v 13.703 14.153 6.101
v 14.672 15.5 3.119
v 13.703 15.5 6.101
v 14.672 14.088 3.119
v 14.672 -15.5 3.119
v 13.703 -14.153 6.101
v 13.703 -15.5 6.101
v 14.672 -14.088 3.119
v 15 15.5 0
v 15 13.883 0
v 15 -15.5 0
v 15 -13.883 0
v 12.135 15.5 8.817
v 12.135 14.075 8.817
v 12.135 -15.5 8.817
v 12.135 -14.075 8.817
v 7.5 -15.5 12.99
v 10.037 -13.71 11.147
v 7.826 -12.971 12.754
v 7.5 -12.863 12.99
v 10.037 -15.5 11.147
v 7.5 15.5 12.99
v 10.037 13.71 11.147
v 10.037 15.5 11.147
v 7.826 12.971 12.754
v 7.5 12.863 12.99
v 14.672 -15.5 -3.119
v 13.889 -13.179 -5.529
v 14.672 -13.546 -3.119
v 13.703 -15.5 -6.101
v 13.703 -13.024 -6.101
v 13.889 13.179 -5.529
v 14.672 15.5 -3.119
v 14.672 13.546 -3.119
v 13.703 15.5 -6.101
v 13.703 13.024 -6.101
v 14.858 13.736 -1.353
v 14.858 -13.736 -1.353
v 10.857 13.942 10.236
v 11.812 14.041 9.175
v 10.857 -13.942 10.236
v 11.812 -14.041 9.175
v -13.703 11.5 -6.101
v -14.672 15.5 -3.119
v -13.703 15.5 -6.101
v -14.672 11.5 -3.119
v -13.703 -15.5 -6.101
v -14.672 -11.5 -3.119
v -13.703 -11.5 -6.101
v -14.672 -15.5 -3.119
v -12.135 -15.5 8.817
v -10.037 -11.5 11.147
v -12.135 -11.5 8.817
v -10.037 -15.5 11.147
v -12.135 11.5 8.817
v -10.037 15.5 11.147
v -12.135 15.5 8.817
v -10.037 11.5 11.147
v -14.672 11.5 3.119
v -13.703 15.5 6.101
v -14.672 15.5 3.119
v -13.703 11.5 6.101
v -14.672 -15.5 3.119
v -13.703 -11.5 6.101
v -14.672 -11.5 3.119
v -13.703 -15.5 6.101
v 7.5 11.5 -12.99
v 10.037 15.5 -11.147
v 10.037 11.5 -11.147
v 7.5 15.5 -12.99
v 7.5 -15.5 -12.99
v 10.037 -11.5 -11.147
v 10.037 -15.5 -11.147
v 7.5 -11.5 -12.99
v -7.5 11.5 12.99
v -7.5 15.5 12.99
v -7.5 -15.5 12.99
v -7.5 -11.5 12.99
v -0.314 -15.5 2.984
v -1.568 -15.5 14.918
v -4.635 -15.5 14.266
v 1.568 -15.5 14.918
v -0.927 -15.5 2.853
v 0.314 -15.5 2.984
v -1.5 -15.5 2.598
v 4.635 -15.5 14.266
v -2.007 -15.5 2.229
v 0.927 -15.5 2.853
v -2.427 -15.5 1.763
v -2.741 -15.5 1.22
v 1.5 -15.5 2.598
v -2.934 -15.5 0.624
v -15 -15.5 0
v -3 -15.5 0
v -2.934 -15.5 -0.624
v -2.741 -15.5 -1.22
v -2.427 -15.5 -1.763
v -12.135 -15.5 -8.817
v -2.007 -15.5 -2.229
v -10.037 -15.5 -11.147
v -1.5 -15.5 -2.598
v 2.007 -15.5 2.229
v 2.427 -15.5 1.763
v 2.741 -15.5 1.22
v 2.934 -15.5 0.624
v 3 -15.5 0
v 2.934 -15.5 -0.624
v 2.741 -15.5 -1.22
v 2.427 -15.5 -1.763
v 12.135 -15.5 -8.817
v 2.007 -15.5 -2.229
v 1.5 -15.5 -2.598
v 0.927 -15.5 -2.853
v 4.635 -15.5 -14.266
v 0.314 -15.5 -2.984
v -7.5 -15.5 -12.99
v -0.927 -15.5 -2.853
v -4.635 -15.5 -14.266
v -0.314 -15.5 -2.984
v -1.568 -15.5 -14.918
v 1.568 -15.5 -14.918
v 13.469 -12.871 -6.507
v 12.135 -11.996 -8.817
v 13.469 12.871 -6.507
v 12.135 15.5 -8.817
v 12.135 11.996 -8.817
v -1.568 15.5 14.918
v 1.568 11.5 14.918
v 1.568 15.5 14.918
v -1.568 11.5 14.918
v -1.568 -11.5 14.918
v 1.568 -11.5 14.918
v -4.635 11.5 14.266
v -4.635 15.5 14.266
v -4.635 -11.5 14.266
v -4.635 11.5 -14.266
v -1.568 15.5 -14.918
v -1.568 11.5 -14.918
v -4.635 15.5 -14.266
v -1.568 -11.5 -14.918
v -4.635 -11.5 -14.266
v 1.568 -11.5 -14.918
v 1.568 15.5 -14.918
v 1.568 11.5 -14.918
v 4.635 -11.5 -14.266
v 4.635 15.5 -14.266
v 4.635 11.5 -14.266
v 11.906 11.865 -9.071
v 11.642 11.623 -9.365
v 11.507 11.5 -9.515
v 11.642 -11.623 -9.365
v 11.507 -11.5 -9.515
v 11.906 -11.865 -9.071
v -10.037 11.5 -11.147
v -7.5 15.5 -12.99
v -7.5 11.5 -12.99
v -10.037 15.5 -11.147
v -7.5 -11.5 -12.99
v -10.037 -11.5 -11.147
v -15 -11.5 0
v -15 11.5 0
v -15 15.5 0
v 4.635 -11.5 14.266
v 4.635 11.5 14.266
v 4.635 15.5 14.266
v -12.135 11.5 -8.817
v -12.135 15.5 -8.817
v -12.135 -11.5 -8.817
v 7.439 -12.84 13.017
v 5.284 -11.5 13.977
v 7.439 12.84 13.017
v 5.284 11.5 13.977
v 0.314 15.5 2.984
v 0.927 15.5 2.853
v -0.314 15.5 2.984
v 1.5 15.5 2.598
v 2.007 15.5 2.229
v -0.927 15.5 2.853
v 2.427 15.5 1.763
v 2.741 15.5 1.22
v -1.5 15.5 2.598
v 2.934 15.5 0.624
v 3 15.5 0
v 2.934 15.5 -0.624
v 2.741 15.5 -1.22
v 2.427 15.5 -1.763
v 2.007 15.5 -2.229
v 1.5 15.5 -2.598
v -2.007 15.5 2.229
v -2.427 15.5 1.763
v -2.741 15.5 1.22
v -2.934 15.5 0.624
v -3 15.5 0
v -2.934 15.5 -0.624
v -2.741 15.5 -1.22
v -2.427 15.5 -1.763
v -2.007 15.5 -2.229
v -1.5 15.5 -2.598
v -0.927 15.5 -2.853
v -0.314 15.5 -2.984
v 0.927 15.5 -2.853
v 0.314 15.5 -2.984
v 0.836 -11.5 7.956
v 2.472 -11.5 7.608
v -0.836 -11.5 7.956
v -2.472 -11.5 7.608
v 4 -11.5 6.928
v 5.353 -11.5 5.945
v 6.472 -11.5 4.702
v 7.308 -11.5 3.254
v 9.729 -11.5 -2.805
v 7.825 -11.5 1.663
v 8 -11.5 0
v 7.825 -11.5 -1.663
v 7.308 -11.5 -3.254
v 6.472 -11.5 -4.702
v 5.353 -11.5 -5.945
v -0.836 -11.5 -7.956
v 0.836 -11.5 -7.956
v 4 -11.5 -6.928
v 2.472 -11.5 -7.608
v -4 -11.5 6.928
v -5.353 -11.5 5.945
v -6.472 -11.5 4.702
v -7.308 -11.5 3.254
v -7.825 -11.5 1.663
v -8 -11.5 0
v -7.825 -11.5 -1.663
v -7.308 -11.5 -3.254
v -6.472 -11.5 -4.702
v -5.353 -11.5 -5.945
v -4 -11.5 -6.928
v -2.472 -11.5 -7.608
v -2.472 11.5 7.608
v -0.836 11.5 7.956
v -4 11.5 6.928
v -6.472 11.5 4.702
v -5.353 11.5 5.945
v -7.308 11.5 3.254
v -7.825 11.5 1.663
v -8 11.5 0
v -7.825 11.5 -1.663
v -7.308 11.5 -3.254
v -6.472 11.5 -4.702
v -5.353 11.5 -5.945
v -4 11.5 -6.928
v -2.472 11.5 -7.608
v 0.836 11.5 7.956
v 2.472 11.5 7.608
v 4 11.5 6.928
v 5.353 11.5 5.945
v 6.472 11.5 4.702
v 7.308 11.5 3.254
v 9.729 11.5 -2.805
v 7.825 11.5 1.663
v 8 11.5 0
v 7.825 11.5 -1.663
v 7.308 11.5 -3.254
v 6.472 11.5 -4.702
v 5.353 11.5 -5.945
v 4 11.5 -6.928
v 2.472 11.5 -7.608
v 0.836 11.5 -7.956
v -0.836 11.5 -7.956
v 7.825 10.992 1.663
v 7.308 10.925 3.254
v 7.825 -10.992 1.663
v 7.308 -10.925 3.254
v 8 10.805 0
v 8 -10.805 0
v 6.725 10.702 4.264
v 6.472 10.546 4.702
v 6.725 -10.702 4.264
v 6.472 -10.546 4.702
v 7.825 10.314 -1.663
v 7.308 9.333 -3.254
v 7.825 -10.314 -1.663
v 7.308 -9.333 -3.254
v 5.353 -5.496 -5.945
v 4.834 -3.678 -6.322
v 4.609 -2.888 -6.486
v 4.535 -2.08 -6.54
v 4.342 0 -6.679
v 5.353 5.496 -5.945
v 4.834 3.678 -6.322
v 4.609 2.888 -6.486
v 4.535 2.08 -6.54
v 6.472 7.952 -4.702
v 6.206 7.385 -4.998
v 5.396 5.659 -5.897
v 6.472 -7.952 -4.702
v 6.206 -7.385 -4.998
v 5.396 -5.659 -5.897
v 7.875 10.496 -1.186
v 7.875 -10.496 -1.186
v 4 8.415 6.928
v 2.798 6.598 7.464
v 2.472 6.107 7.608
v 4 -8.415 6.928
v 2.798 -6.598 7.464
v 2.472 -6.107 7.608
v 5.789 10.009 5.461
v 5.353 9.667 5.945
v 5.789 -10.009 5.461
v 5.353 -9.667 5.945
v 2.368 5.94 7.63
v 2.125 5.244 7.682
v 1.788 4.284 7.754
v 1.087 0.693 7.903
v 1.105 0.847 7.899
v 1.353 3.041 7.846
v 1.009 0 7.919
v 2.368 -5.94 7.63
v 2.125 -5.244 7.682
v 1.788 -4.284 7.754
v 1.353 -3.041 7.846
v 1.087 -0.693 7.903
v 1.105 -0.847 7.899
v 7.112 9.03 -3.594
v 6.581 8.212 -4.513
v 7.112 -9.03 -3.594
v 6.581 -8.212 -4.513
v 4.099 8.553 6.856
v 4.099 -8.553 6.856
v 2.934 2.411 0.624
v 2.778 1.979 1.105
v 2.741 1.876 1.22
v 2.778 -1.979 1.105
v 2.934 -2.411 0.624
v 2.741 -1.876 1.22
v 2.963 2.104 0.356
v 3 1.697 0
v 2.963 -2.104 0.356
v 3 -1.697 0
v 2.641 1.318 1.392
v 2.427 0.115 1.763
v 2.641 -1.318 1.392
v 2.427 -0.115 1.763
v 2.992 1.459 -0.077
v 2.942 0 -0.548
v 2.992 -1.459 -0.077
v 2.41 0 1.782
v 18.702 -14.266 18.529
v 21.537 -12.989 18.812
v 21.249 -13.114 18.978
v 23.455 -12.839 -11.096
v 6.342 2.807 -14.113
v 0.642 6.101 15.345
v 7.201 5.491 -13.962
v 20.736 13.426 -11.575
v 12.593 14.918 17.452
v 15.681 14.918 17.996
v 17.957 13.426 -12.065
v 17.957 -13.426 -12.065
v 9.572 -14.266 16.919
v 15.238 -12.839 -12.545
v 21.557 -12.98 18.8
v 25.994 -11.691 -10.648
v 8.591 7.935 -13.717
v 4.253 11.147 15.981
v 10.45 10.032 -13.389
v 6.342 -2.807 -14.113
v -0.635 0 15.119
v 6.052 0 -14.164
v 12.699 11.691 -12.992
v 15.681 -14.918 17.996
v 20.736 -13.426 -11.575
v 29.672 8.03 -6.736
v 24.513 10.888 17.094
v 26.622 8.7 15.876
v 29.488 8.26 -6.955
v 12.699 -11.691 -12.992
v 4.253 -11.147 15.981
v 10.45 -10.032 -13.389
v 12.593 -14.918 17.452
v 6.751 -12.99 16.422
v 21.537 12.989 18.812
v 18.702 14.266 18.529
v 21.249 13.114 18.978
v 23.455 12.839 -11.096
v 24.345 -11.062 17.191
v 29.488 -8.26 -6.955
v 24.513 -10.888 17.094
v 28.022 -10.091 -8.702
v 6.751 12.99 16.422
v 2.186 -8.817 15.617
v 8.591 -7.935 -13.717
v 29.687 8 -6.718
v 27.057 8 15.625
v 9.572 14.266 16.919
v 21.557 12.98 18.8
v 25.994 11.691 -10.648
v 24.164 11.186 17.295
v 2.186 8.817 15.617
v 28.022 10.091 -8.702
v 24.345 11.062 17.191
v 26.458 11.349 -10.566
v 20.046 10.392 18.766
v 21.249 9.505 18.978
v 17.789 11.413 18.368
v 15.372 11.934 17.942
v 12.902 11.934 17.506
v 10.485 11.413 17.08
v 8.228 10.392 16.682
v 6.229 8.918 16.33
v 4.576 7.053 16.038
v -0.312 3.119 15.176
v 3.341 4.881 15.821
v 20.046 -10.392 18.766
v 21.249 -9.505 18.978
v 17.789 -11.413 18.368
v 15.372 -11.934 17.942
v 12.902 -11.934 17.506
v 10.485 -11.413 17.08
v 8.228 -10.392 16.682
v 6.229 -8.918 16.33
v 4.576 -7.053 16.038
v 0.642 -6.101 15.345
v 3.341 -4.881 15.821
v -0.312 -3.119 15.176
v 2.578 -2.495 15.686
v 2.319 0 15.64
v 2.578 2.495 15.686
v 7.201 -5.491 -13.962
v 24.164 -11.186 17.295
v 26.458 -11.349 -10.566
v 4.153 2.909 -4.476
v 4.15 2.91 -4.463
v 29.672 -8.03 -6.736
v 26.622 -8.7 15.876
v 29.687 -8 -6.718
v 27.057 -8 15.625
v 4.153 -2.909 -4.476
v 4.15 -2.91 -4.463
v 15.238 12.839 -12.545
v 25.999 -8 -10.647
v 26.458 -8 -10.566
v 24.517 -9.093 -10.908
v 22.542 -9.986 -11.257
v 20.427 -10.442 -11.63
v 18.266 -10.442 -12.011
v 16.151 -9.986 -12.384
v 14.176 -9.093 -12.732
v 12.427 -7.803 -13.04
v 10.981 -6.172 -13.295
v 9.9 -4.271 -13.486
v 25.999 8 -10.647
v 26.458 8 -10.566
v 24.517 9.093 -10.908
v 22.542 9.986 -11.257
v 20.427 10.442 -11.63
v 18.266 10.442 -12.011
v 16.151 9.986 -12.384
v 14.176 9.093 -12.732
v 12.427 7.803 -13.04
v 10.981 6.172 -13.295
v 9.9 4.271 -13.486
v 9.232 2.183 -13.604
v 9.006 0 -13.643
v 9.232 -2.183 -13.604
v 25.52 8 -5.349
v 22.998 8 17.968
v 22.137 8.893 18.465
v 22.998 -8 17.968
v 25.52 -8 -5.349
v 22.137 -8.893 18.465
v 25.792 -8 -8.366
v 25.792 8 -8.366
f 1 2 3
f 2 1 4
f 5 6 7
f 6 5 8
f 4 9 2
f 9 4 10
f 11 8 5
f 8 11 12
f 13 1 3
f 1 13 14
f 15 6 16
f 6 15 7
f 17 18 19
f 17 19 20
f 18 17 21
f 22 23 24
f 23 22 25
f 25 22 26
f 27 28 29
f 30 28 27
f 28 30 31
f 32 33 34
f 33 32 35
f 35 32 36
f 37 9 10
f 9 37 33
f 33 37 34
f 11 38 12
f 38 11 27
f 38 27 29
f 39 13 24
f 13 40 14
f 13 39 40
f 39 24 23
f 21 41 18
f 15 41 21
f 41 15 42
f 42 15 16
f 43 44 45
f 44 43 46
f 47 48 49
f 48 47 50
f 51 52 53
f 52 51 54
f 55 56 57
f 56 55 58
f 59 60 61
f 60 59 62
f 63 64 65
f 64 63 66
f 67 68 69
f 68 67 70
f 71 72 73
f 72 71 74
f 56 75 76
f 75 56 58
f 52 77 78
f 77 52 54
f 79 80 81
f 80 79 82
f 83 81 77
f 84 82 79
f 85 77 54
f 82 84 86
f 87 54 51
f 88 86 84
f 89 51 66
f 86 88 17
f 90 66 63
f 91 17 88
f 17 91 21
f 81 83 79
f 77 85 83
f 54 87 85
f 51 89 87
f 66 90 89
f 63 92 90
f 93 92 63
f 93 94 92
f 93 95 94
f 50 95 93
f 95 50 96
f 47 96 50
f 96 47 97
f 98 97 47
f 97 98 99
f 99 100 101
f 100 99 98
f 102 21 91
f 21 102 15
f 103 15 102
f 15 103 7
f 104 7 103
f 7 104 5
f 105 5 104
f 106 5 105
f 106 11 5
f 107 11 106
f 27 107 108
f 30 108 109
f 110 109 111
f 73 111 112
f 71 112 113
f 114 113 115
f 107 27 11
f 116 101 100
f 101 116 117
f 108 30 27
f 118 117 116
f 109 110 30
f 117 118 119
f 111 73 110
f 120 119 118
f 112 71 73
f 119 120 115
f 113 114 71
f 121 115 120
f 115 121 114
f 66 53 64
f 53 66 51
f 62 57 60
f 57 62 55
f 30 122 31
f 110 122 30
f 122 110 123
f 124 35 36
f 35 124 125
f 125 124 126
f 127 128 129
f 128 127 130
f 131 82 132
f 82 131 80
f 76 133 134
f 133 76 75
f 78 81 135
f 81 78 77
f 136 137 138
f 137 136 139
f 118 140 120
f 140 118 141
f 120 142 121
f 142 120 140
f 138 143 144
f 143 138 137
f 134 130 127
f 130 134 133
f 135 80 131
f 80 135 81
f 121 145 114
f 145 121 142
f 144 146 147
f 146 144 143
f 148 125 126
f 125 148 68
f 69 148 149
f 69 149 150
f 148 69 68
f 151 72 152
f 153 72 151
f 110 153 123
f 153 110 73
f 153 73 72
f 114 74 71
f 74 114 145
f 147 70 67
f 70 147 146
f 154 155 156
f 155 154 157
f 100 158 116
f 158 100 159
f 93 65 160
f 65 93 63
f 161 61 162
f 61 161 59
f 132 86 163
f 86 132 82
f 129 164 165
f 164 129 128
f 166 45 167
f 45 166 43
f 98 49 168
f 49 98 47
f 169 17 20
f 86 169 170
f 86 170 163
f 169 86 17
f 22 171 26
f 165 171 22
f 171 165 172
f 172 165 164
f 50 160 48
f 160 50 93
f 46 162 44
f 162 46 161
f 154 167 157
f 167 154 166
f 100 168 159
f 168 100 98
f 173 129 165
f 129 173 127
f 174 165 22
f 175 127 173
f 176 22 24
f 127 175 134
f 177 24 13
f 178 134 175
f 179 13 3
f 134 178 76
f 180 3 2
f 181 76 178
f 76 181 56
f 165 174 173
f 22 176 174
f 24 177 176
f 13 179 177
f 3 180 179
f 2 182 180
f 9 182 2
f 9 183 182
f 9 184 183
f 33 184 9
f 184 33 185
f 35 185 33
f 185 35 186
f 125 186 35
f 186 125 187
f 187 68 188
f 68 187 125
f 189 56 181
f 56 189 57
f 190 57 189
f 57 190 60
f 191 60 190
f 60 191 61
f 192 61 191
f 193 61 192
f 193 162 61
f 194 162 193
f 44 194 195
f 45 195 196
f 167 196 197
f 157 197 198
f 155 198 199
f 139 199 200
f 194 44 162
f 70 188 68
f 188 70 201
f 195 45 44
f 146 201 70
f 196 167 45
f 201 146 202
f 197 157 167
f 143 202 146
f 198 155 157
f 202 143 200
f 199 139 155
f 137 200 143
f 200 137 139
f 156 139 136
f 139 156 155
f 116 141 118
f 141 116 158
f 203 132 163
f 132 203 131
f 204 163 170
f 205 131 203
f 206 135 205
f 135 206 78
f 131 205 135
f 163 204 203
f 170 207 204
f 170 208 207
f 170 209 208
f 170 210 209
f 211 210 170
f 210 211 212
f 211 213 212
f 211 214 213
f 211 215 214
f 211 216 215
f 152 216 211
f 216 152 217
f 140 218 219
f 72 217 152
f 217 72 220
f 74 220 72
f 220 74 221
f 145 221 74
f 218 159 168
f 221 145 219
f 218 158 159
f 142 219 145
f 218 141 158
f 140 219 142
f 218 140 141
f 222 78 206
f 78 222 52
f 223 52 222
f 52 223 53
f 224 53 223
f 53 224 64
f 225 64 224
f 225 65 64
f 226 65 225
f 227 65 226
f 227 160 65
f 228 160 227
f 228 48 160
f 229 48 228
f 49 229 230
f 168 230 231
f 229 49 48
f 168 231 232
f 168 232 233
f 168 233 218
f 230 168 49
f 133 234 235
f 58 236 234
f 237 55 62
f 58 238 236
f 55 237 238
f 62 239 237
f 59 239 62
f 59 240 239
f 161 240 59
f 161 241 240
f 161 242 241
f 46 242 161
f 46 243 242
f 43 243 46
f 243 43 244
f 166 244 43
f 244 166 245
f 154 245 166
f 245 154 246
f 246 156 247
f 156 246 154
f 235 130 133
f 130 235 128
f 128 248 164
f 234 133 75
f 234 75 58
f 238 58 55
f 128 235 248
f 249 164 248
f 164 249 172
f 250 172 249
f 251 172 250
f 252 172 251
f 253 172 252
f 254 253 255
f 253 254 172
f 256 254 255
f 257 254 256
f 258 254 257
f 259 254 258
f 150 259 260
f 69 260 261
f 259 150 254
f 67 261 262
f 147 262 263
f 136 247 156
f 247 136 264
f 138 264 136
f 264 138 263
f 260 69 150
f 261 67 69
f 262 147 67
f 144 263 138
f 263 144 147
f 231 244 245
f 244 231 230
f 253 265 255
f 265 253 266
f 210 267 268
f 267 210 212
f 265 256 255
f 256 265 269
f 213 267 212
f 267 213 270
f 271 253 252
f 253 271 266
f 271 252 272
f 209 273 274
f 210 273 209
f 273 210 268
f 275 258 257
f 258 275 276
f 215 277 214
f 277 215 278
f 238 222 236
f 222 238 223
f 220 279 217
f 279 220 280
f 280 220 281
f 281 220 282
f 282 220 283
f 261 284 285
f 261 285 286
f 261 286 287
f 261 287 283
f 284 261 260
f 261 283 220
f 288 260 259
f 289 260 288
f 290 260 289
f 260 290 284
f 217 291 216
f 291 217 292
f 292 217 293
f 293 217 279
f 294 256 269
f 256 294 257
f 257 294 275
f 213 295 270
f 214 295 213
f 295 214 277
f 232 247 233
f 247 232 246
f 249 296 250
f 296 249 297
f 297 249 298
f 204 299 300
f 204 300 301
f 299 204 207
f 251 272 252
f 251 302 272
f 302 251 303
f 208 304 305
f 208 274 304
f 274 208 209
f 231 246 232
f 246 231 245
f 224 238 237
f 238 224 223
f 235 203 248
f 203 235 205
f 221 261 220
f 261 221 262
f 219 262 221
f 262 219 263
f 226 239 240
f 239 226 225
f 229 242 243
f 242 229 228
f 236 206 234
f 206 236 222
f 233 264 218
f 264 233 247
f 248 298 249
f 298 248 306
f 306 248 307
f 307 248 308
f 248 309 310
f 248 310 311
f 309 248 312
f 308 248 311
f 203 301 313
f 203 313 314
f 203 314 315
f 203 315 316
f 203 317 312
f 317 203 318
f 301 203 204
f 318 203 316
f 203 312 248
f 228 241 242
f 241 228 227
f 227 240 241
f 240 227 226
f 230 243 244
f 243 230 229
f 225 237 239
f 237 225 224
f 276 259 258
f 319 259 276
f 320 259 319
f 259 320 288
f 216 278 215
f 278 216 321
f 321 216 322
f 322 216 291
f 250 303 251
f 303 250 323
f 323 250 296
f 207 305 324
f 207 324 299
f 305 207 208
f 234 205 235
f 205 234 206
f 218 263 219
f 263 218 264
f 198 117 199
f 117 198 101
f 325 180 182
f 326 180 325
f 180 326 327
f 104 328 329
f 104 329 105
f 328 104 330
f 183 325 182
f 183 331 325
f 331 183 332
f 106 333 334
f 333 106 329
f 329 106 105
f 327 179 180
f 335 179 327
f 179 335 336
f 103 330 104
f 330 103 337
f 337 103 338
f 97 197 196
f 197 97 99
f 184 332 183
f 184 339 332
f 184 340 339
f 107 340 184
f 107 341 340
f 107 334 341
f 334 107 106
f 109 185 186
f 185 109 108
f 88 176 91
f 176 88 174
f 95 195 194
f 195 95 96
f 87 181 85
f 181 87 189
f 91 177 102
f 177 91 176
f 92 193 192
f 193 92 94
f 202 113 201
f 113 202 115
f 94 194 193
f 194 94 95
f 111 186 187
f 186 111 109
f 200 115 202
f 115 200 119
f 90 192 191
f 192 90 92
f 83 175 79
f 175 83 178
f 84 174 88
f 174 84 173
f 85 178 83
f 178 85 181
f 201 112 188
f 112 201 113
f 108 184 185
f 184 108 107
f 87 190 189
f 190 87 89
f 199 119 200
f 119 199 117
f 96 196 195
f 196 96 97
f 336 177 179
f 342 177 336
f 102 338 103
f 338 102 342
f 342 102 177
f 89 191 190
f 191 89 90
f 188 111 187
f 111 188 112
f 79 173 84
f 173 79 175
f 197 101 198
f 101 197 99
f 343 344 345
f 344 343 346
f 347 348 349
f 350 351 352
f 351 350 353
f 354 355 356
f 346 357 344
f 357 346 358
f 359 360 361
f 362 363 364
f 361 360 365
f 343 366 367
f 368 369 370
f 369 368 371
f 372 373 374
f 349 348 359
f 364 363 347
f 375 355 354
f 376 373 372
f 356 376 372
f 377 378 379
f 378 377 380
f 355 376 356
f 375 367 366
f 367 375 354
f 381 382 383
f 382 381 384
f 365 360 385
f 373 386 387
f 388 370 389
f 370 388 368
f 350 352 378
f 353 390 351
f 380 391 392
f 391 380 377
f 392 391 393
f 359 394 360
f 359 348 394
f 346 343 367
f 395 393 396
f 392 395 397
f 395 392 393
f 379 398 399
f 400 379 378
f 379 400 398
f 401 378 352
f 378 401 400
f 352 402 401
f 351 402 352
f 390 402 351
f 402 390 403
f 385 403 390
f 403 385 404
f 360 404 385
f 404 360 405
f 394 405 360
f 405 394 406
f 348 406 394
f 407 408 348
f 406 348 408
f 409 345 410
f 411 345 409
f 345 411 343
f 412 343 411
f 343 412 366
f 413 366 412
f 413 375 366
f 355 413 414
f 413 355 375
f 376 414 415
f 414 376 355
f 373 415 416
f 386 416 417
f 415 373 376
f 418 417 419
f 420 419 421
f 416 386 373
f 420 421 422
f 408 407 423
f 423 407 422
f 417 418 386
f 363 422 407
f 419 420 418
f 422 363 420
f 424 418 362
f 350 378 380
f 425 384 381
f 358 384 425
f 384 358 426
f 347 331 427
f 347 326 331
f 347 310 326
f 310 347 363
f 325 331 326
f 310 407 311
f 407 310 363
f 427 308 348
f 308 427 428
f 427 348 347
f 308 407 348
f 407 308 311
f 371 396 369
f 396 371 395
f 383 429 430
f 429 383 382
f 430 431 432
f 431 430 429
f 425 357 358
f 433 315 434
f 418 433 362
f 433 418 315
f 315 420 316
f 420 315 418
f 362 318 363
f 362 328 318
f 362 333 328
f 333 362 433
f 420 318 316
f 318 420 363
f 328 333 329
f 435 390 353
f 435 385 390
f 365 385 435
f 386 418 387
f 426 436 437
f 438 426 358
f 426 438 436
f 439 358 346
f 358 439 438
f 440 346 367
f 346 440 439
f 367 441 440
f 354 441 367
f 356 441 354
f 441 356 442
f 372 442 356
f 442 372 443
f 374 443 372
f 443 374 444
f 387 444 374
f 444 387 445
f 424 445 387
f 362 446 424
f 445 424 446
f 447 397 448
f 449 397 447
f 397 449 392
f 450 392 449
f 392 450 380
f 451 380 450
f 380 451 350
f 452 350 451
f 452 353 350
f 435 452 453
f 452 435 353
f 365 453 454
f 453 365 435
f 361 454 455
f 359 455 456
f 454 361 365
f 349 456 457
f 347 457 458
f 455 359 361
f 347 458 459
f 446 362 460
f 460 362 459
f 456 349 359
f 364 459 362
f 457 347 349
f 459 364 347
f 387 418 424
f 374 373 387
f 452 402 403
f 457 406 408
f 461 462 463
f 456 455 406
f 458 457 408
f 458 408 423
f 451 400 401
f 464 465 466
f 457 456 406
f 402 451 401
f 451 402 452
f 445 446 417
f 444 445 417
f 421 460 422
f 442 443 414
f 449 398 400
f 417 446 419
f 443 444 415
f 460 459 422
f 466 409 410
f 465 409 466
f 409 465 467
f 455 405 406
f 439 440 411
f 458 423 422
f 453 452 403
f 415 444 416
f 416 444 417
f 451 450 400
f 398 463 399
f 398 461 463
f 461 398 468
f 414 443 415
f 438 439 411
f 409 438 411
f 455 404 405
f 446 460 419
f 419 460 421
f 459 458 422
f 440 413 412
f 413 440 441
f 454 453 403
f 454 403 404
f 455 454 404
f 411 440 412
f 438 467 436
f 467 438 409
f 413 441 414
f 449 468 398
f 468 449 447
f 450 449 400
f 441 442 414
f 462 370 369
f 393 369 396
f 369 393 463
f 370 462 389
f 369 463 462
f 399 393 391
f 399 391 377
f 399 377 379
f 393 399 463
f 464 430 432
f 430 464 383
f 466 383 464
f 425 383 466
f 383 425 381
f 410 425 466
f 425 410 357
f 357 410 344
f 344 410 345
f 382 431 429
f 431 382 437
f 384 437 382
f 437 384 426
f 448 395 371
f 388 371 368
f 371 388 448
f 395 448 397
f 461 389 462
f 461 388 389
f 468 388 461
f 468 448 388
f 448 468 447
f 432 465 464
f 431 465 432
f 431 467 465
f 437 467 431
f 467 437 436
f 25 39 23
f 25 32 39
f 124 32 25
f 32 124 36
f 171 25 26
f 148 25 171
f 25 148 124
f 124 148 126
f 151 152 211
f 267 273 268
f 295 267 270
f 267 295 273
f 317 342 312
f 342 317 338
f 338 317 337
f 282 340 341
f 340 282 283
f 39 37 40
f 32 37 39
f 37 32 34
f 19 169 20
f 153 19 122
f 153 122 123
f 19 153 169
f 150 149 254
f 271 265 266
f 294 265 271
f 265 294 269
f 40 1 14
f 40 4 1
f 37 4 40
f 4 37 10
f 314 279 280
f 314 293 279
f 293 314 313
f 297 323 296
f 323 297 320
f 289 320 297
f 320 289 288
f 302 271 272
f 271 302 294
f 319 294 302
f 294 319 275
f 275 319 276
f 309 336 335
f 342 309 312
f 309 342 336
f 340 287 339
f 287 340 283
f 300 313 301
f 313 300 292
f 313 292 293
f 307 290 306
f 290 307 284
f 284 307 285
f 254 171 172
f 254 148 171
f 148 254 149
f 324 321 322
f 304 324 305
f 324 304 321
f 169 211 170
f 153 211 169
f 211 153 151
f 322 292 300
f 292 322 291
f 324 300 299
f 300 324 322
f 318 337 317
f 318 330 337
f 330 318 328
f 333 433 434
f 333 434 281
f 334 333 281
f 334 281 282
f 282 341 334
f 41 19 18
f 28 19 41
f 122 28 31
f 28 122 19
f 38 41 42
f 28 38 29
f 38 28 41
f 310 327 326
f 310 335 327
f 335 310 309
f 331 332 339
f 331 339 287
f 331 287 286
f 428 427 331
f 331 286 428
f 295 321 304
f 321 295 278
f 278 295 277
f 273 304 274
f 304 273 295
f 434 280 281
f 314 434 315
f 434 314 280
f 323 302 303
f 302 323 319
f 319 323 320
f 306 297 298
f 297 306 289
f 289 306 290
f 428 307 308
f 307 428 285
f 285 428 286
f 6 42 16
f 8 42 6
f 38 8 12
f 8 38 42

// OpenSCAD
// Customizable Shower Holder
// Copyright: Olle Johansson 2018
// License: CC BY-SA

//CUSTOMIZER VARIABLES

/* [Fastener] */

width_of_cylinder = 31;

diameter_of_cylinder = 16;

diameter_of_disks = 30;

thickness_of_disks = 4;

hole_in_cylinder = 6;

/* [Holder] */

holder_height = 30;

holder_wall_width = 6;

holder_top_diameter = 24;

holder_bottom_diameter = 21;

holder_angle = 10;

holder_hole_width = 16;

//CUSTOMIZER VARIABLES END

/* [Hidden] */

$fn=30;

module spool() {
    difference() {
        cylinder(h = width_of_cylinder, d = diameter_of_disks, center = true);
        cylinder(h = width_of_cylinder - thickness_of_disks * 2, d = diameter_of_disks, center = true);
    }
    cylinder(h = width_of_cylinder, d = diameter_of_cylinder, center = true);
}

module fastener() {
    rotate([90, 0, 0])
    difference() {
        spool();
        cylinder(h = width_of_cylinder, d = hole_in_cylinder, center = true);
    }
}

module fastener_full() {
    rotate([90, 0, 0])
    difference() {
        cylinder(h = width_of_cylinder, d = diameter_of_disks, center = true);
        cylinder(h = width_of_cylinder, d = diameter_of_disks, center = true);
        cylinder(h = width_of_cylinder, d = hole_in_cylinder, center = true);
    }
}

module holder() {
    rotate([0, 0 - holder_angle, 0])
    translate([17, 0, 0])
    difference() {
        cylinder(h = holder_height, d1 = holder_bottom_diameter + holder_wall_width, d2 = holder_top_diameter + holder_wall_width, center = true);
        cylinder(h = holder_height, d1 = holder_bottom_diameter, d2 = holder_top_diameter, center = true);

        // Chamfer on top edge
        translate([holder_top_diameter / 2 + holder_wall_width / 2, 0, holder_height / 2])
        rotate([0, 40, 0])
        cube([holder_top_diameter, holder_top_diameter * 1.5, 10], center=true);

        // Chamfer on bottom edge
        translate([holder_top_diameter / 2 + holder_wall_width / 2, 0, 0 - holder_height / 2])
        rotate([0, -40, 0])
        cube([holder_top_diameter, holder_top_diameter * 1.5, 10], center=true);

        // Front hole
        translate([holder_top_diameter / 2.5, 0, 0])
            cube([holder_top_diameter / 2, holder_hole_width, holder_height], center = true);
    }
}

module shower_holder() {
    difference() {
        fastener();
        hull() holder();
    }
    holder();
}

shower_holder();
